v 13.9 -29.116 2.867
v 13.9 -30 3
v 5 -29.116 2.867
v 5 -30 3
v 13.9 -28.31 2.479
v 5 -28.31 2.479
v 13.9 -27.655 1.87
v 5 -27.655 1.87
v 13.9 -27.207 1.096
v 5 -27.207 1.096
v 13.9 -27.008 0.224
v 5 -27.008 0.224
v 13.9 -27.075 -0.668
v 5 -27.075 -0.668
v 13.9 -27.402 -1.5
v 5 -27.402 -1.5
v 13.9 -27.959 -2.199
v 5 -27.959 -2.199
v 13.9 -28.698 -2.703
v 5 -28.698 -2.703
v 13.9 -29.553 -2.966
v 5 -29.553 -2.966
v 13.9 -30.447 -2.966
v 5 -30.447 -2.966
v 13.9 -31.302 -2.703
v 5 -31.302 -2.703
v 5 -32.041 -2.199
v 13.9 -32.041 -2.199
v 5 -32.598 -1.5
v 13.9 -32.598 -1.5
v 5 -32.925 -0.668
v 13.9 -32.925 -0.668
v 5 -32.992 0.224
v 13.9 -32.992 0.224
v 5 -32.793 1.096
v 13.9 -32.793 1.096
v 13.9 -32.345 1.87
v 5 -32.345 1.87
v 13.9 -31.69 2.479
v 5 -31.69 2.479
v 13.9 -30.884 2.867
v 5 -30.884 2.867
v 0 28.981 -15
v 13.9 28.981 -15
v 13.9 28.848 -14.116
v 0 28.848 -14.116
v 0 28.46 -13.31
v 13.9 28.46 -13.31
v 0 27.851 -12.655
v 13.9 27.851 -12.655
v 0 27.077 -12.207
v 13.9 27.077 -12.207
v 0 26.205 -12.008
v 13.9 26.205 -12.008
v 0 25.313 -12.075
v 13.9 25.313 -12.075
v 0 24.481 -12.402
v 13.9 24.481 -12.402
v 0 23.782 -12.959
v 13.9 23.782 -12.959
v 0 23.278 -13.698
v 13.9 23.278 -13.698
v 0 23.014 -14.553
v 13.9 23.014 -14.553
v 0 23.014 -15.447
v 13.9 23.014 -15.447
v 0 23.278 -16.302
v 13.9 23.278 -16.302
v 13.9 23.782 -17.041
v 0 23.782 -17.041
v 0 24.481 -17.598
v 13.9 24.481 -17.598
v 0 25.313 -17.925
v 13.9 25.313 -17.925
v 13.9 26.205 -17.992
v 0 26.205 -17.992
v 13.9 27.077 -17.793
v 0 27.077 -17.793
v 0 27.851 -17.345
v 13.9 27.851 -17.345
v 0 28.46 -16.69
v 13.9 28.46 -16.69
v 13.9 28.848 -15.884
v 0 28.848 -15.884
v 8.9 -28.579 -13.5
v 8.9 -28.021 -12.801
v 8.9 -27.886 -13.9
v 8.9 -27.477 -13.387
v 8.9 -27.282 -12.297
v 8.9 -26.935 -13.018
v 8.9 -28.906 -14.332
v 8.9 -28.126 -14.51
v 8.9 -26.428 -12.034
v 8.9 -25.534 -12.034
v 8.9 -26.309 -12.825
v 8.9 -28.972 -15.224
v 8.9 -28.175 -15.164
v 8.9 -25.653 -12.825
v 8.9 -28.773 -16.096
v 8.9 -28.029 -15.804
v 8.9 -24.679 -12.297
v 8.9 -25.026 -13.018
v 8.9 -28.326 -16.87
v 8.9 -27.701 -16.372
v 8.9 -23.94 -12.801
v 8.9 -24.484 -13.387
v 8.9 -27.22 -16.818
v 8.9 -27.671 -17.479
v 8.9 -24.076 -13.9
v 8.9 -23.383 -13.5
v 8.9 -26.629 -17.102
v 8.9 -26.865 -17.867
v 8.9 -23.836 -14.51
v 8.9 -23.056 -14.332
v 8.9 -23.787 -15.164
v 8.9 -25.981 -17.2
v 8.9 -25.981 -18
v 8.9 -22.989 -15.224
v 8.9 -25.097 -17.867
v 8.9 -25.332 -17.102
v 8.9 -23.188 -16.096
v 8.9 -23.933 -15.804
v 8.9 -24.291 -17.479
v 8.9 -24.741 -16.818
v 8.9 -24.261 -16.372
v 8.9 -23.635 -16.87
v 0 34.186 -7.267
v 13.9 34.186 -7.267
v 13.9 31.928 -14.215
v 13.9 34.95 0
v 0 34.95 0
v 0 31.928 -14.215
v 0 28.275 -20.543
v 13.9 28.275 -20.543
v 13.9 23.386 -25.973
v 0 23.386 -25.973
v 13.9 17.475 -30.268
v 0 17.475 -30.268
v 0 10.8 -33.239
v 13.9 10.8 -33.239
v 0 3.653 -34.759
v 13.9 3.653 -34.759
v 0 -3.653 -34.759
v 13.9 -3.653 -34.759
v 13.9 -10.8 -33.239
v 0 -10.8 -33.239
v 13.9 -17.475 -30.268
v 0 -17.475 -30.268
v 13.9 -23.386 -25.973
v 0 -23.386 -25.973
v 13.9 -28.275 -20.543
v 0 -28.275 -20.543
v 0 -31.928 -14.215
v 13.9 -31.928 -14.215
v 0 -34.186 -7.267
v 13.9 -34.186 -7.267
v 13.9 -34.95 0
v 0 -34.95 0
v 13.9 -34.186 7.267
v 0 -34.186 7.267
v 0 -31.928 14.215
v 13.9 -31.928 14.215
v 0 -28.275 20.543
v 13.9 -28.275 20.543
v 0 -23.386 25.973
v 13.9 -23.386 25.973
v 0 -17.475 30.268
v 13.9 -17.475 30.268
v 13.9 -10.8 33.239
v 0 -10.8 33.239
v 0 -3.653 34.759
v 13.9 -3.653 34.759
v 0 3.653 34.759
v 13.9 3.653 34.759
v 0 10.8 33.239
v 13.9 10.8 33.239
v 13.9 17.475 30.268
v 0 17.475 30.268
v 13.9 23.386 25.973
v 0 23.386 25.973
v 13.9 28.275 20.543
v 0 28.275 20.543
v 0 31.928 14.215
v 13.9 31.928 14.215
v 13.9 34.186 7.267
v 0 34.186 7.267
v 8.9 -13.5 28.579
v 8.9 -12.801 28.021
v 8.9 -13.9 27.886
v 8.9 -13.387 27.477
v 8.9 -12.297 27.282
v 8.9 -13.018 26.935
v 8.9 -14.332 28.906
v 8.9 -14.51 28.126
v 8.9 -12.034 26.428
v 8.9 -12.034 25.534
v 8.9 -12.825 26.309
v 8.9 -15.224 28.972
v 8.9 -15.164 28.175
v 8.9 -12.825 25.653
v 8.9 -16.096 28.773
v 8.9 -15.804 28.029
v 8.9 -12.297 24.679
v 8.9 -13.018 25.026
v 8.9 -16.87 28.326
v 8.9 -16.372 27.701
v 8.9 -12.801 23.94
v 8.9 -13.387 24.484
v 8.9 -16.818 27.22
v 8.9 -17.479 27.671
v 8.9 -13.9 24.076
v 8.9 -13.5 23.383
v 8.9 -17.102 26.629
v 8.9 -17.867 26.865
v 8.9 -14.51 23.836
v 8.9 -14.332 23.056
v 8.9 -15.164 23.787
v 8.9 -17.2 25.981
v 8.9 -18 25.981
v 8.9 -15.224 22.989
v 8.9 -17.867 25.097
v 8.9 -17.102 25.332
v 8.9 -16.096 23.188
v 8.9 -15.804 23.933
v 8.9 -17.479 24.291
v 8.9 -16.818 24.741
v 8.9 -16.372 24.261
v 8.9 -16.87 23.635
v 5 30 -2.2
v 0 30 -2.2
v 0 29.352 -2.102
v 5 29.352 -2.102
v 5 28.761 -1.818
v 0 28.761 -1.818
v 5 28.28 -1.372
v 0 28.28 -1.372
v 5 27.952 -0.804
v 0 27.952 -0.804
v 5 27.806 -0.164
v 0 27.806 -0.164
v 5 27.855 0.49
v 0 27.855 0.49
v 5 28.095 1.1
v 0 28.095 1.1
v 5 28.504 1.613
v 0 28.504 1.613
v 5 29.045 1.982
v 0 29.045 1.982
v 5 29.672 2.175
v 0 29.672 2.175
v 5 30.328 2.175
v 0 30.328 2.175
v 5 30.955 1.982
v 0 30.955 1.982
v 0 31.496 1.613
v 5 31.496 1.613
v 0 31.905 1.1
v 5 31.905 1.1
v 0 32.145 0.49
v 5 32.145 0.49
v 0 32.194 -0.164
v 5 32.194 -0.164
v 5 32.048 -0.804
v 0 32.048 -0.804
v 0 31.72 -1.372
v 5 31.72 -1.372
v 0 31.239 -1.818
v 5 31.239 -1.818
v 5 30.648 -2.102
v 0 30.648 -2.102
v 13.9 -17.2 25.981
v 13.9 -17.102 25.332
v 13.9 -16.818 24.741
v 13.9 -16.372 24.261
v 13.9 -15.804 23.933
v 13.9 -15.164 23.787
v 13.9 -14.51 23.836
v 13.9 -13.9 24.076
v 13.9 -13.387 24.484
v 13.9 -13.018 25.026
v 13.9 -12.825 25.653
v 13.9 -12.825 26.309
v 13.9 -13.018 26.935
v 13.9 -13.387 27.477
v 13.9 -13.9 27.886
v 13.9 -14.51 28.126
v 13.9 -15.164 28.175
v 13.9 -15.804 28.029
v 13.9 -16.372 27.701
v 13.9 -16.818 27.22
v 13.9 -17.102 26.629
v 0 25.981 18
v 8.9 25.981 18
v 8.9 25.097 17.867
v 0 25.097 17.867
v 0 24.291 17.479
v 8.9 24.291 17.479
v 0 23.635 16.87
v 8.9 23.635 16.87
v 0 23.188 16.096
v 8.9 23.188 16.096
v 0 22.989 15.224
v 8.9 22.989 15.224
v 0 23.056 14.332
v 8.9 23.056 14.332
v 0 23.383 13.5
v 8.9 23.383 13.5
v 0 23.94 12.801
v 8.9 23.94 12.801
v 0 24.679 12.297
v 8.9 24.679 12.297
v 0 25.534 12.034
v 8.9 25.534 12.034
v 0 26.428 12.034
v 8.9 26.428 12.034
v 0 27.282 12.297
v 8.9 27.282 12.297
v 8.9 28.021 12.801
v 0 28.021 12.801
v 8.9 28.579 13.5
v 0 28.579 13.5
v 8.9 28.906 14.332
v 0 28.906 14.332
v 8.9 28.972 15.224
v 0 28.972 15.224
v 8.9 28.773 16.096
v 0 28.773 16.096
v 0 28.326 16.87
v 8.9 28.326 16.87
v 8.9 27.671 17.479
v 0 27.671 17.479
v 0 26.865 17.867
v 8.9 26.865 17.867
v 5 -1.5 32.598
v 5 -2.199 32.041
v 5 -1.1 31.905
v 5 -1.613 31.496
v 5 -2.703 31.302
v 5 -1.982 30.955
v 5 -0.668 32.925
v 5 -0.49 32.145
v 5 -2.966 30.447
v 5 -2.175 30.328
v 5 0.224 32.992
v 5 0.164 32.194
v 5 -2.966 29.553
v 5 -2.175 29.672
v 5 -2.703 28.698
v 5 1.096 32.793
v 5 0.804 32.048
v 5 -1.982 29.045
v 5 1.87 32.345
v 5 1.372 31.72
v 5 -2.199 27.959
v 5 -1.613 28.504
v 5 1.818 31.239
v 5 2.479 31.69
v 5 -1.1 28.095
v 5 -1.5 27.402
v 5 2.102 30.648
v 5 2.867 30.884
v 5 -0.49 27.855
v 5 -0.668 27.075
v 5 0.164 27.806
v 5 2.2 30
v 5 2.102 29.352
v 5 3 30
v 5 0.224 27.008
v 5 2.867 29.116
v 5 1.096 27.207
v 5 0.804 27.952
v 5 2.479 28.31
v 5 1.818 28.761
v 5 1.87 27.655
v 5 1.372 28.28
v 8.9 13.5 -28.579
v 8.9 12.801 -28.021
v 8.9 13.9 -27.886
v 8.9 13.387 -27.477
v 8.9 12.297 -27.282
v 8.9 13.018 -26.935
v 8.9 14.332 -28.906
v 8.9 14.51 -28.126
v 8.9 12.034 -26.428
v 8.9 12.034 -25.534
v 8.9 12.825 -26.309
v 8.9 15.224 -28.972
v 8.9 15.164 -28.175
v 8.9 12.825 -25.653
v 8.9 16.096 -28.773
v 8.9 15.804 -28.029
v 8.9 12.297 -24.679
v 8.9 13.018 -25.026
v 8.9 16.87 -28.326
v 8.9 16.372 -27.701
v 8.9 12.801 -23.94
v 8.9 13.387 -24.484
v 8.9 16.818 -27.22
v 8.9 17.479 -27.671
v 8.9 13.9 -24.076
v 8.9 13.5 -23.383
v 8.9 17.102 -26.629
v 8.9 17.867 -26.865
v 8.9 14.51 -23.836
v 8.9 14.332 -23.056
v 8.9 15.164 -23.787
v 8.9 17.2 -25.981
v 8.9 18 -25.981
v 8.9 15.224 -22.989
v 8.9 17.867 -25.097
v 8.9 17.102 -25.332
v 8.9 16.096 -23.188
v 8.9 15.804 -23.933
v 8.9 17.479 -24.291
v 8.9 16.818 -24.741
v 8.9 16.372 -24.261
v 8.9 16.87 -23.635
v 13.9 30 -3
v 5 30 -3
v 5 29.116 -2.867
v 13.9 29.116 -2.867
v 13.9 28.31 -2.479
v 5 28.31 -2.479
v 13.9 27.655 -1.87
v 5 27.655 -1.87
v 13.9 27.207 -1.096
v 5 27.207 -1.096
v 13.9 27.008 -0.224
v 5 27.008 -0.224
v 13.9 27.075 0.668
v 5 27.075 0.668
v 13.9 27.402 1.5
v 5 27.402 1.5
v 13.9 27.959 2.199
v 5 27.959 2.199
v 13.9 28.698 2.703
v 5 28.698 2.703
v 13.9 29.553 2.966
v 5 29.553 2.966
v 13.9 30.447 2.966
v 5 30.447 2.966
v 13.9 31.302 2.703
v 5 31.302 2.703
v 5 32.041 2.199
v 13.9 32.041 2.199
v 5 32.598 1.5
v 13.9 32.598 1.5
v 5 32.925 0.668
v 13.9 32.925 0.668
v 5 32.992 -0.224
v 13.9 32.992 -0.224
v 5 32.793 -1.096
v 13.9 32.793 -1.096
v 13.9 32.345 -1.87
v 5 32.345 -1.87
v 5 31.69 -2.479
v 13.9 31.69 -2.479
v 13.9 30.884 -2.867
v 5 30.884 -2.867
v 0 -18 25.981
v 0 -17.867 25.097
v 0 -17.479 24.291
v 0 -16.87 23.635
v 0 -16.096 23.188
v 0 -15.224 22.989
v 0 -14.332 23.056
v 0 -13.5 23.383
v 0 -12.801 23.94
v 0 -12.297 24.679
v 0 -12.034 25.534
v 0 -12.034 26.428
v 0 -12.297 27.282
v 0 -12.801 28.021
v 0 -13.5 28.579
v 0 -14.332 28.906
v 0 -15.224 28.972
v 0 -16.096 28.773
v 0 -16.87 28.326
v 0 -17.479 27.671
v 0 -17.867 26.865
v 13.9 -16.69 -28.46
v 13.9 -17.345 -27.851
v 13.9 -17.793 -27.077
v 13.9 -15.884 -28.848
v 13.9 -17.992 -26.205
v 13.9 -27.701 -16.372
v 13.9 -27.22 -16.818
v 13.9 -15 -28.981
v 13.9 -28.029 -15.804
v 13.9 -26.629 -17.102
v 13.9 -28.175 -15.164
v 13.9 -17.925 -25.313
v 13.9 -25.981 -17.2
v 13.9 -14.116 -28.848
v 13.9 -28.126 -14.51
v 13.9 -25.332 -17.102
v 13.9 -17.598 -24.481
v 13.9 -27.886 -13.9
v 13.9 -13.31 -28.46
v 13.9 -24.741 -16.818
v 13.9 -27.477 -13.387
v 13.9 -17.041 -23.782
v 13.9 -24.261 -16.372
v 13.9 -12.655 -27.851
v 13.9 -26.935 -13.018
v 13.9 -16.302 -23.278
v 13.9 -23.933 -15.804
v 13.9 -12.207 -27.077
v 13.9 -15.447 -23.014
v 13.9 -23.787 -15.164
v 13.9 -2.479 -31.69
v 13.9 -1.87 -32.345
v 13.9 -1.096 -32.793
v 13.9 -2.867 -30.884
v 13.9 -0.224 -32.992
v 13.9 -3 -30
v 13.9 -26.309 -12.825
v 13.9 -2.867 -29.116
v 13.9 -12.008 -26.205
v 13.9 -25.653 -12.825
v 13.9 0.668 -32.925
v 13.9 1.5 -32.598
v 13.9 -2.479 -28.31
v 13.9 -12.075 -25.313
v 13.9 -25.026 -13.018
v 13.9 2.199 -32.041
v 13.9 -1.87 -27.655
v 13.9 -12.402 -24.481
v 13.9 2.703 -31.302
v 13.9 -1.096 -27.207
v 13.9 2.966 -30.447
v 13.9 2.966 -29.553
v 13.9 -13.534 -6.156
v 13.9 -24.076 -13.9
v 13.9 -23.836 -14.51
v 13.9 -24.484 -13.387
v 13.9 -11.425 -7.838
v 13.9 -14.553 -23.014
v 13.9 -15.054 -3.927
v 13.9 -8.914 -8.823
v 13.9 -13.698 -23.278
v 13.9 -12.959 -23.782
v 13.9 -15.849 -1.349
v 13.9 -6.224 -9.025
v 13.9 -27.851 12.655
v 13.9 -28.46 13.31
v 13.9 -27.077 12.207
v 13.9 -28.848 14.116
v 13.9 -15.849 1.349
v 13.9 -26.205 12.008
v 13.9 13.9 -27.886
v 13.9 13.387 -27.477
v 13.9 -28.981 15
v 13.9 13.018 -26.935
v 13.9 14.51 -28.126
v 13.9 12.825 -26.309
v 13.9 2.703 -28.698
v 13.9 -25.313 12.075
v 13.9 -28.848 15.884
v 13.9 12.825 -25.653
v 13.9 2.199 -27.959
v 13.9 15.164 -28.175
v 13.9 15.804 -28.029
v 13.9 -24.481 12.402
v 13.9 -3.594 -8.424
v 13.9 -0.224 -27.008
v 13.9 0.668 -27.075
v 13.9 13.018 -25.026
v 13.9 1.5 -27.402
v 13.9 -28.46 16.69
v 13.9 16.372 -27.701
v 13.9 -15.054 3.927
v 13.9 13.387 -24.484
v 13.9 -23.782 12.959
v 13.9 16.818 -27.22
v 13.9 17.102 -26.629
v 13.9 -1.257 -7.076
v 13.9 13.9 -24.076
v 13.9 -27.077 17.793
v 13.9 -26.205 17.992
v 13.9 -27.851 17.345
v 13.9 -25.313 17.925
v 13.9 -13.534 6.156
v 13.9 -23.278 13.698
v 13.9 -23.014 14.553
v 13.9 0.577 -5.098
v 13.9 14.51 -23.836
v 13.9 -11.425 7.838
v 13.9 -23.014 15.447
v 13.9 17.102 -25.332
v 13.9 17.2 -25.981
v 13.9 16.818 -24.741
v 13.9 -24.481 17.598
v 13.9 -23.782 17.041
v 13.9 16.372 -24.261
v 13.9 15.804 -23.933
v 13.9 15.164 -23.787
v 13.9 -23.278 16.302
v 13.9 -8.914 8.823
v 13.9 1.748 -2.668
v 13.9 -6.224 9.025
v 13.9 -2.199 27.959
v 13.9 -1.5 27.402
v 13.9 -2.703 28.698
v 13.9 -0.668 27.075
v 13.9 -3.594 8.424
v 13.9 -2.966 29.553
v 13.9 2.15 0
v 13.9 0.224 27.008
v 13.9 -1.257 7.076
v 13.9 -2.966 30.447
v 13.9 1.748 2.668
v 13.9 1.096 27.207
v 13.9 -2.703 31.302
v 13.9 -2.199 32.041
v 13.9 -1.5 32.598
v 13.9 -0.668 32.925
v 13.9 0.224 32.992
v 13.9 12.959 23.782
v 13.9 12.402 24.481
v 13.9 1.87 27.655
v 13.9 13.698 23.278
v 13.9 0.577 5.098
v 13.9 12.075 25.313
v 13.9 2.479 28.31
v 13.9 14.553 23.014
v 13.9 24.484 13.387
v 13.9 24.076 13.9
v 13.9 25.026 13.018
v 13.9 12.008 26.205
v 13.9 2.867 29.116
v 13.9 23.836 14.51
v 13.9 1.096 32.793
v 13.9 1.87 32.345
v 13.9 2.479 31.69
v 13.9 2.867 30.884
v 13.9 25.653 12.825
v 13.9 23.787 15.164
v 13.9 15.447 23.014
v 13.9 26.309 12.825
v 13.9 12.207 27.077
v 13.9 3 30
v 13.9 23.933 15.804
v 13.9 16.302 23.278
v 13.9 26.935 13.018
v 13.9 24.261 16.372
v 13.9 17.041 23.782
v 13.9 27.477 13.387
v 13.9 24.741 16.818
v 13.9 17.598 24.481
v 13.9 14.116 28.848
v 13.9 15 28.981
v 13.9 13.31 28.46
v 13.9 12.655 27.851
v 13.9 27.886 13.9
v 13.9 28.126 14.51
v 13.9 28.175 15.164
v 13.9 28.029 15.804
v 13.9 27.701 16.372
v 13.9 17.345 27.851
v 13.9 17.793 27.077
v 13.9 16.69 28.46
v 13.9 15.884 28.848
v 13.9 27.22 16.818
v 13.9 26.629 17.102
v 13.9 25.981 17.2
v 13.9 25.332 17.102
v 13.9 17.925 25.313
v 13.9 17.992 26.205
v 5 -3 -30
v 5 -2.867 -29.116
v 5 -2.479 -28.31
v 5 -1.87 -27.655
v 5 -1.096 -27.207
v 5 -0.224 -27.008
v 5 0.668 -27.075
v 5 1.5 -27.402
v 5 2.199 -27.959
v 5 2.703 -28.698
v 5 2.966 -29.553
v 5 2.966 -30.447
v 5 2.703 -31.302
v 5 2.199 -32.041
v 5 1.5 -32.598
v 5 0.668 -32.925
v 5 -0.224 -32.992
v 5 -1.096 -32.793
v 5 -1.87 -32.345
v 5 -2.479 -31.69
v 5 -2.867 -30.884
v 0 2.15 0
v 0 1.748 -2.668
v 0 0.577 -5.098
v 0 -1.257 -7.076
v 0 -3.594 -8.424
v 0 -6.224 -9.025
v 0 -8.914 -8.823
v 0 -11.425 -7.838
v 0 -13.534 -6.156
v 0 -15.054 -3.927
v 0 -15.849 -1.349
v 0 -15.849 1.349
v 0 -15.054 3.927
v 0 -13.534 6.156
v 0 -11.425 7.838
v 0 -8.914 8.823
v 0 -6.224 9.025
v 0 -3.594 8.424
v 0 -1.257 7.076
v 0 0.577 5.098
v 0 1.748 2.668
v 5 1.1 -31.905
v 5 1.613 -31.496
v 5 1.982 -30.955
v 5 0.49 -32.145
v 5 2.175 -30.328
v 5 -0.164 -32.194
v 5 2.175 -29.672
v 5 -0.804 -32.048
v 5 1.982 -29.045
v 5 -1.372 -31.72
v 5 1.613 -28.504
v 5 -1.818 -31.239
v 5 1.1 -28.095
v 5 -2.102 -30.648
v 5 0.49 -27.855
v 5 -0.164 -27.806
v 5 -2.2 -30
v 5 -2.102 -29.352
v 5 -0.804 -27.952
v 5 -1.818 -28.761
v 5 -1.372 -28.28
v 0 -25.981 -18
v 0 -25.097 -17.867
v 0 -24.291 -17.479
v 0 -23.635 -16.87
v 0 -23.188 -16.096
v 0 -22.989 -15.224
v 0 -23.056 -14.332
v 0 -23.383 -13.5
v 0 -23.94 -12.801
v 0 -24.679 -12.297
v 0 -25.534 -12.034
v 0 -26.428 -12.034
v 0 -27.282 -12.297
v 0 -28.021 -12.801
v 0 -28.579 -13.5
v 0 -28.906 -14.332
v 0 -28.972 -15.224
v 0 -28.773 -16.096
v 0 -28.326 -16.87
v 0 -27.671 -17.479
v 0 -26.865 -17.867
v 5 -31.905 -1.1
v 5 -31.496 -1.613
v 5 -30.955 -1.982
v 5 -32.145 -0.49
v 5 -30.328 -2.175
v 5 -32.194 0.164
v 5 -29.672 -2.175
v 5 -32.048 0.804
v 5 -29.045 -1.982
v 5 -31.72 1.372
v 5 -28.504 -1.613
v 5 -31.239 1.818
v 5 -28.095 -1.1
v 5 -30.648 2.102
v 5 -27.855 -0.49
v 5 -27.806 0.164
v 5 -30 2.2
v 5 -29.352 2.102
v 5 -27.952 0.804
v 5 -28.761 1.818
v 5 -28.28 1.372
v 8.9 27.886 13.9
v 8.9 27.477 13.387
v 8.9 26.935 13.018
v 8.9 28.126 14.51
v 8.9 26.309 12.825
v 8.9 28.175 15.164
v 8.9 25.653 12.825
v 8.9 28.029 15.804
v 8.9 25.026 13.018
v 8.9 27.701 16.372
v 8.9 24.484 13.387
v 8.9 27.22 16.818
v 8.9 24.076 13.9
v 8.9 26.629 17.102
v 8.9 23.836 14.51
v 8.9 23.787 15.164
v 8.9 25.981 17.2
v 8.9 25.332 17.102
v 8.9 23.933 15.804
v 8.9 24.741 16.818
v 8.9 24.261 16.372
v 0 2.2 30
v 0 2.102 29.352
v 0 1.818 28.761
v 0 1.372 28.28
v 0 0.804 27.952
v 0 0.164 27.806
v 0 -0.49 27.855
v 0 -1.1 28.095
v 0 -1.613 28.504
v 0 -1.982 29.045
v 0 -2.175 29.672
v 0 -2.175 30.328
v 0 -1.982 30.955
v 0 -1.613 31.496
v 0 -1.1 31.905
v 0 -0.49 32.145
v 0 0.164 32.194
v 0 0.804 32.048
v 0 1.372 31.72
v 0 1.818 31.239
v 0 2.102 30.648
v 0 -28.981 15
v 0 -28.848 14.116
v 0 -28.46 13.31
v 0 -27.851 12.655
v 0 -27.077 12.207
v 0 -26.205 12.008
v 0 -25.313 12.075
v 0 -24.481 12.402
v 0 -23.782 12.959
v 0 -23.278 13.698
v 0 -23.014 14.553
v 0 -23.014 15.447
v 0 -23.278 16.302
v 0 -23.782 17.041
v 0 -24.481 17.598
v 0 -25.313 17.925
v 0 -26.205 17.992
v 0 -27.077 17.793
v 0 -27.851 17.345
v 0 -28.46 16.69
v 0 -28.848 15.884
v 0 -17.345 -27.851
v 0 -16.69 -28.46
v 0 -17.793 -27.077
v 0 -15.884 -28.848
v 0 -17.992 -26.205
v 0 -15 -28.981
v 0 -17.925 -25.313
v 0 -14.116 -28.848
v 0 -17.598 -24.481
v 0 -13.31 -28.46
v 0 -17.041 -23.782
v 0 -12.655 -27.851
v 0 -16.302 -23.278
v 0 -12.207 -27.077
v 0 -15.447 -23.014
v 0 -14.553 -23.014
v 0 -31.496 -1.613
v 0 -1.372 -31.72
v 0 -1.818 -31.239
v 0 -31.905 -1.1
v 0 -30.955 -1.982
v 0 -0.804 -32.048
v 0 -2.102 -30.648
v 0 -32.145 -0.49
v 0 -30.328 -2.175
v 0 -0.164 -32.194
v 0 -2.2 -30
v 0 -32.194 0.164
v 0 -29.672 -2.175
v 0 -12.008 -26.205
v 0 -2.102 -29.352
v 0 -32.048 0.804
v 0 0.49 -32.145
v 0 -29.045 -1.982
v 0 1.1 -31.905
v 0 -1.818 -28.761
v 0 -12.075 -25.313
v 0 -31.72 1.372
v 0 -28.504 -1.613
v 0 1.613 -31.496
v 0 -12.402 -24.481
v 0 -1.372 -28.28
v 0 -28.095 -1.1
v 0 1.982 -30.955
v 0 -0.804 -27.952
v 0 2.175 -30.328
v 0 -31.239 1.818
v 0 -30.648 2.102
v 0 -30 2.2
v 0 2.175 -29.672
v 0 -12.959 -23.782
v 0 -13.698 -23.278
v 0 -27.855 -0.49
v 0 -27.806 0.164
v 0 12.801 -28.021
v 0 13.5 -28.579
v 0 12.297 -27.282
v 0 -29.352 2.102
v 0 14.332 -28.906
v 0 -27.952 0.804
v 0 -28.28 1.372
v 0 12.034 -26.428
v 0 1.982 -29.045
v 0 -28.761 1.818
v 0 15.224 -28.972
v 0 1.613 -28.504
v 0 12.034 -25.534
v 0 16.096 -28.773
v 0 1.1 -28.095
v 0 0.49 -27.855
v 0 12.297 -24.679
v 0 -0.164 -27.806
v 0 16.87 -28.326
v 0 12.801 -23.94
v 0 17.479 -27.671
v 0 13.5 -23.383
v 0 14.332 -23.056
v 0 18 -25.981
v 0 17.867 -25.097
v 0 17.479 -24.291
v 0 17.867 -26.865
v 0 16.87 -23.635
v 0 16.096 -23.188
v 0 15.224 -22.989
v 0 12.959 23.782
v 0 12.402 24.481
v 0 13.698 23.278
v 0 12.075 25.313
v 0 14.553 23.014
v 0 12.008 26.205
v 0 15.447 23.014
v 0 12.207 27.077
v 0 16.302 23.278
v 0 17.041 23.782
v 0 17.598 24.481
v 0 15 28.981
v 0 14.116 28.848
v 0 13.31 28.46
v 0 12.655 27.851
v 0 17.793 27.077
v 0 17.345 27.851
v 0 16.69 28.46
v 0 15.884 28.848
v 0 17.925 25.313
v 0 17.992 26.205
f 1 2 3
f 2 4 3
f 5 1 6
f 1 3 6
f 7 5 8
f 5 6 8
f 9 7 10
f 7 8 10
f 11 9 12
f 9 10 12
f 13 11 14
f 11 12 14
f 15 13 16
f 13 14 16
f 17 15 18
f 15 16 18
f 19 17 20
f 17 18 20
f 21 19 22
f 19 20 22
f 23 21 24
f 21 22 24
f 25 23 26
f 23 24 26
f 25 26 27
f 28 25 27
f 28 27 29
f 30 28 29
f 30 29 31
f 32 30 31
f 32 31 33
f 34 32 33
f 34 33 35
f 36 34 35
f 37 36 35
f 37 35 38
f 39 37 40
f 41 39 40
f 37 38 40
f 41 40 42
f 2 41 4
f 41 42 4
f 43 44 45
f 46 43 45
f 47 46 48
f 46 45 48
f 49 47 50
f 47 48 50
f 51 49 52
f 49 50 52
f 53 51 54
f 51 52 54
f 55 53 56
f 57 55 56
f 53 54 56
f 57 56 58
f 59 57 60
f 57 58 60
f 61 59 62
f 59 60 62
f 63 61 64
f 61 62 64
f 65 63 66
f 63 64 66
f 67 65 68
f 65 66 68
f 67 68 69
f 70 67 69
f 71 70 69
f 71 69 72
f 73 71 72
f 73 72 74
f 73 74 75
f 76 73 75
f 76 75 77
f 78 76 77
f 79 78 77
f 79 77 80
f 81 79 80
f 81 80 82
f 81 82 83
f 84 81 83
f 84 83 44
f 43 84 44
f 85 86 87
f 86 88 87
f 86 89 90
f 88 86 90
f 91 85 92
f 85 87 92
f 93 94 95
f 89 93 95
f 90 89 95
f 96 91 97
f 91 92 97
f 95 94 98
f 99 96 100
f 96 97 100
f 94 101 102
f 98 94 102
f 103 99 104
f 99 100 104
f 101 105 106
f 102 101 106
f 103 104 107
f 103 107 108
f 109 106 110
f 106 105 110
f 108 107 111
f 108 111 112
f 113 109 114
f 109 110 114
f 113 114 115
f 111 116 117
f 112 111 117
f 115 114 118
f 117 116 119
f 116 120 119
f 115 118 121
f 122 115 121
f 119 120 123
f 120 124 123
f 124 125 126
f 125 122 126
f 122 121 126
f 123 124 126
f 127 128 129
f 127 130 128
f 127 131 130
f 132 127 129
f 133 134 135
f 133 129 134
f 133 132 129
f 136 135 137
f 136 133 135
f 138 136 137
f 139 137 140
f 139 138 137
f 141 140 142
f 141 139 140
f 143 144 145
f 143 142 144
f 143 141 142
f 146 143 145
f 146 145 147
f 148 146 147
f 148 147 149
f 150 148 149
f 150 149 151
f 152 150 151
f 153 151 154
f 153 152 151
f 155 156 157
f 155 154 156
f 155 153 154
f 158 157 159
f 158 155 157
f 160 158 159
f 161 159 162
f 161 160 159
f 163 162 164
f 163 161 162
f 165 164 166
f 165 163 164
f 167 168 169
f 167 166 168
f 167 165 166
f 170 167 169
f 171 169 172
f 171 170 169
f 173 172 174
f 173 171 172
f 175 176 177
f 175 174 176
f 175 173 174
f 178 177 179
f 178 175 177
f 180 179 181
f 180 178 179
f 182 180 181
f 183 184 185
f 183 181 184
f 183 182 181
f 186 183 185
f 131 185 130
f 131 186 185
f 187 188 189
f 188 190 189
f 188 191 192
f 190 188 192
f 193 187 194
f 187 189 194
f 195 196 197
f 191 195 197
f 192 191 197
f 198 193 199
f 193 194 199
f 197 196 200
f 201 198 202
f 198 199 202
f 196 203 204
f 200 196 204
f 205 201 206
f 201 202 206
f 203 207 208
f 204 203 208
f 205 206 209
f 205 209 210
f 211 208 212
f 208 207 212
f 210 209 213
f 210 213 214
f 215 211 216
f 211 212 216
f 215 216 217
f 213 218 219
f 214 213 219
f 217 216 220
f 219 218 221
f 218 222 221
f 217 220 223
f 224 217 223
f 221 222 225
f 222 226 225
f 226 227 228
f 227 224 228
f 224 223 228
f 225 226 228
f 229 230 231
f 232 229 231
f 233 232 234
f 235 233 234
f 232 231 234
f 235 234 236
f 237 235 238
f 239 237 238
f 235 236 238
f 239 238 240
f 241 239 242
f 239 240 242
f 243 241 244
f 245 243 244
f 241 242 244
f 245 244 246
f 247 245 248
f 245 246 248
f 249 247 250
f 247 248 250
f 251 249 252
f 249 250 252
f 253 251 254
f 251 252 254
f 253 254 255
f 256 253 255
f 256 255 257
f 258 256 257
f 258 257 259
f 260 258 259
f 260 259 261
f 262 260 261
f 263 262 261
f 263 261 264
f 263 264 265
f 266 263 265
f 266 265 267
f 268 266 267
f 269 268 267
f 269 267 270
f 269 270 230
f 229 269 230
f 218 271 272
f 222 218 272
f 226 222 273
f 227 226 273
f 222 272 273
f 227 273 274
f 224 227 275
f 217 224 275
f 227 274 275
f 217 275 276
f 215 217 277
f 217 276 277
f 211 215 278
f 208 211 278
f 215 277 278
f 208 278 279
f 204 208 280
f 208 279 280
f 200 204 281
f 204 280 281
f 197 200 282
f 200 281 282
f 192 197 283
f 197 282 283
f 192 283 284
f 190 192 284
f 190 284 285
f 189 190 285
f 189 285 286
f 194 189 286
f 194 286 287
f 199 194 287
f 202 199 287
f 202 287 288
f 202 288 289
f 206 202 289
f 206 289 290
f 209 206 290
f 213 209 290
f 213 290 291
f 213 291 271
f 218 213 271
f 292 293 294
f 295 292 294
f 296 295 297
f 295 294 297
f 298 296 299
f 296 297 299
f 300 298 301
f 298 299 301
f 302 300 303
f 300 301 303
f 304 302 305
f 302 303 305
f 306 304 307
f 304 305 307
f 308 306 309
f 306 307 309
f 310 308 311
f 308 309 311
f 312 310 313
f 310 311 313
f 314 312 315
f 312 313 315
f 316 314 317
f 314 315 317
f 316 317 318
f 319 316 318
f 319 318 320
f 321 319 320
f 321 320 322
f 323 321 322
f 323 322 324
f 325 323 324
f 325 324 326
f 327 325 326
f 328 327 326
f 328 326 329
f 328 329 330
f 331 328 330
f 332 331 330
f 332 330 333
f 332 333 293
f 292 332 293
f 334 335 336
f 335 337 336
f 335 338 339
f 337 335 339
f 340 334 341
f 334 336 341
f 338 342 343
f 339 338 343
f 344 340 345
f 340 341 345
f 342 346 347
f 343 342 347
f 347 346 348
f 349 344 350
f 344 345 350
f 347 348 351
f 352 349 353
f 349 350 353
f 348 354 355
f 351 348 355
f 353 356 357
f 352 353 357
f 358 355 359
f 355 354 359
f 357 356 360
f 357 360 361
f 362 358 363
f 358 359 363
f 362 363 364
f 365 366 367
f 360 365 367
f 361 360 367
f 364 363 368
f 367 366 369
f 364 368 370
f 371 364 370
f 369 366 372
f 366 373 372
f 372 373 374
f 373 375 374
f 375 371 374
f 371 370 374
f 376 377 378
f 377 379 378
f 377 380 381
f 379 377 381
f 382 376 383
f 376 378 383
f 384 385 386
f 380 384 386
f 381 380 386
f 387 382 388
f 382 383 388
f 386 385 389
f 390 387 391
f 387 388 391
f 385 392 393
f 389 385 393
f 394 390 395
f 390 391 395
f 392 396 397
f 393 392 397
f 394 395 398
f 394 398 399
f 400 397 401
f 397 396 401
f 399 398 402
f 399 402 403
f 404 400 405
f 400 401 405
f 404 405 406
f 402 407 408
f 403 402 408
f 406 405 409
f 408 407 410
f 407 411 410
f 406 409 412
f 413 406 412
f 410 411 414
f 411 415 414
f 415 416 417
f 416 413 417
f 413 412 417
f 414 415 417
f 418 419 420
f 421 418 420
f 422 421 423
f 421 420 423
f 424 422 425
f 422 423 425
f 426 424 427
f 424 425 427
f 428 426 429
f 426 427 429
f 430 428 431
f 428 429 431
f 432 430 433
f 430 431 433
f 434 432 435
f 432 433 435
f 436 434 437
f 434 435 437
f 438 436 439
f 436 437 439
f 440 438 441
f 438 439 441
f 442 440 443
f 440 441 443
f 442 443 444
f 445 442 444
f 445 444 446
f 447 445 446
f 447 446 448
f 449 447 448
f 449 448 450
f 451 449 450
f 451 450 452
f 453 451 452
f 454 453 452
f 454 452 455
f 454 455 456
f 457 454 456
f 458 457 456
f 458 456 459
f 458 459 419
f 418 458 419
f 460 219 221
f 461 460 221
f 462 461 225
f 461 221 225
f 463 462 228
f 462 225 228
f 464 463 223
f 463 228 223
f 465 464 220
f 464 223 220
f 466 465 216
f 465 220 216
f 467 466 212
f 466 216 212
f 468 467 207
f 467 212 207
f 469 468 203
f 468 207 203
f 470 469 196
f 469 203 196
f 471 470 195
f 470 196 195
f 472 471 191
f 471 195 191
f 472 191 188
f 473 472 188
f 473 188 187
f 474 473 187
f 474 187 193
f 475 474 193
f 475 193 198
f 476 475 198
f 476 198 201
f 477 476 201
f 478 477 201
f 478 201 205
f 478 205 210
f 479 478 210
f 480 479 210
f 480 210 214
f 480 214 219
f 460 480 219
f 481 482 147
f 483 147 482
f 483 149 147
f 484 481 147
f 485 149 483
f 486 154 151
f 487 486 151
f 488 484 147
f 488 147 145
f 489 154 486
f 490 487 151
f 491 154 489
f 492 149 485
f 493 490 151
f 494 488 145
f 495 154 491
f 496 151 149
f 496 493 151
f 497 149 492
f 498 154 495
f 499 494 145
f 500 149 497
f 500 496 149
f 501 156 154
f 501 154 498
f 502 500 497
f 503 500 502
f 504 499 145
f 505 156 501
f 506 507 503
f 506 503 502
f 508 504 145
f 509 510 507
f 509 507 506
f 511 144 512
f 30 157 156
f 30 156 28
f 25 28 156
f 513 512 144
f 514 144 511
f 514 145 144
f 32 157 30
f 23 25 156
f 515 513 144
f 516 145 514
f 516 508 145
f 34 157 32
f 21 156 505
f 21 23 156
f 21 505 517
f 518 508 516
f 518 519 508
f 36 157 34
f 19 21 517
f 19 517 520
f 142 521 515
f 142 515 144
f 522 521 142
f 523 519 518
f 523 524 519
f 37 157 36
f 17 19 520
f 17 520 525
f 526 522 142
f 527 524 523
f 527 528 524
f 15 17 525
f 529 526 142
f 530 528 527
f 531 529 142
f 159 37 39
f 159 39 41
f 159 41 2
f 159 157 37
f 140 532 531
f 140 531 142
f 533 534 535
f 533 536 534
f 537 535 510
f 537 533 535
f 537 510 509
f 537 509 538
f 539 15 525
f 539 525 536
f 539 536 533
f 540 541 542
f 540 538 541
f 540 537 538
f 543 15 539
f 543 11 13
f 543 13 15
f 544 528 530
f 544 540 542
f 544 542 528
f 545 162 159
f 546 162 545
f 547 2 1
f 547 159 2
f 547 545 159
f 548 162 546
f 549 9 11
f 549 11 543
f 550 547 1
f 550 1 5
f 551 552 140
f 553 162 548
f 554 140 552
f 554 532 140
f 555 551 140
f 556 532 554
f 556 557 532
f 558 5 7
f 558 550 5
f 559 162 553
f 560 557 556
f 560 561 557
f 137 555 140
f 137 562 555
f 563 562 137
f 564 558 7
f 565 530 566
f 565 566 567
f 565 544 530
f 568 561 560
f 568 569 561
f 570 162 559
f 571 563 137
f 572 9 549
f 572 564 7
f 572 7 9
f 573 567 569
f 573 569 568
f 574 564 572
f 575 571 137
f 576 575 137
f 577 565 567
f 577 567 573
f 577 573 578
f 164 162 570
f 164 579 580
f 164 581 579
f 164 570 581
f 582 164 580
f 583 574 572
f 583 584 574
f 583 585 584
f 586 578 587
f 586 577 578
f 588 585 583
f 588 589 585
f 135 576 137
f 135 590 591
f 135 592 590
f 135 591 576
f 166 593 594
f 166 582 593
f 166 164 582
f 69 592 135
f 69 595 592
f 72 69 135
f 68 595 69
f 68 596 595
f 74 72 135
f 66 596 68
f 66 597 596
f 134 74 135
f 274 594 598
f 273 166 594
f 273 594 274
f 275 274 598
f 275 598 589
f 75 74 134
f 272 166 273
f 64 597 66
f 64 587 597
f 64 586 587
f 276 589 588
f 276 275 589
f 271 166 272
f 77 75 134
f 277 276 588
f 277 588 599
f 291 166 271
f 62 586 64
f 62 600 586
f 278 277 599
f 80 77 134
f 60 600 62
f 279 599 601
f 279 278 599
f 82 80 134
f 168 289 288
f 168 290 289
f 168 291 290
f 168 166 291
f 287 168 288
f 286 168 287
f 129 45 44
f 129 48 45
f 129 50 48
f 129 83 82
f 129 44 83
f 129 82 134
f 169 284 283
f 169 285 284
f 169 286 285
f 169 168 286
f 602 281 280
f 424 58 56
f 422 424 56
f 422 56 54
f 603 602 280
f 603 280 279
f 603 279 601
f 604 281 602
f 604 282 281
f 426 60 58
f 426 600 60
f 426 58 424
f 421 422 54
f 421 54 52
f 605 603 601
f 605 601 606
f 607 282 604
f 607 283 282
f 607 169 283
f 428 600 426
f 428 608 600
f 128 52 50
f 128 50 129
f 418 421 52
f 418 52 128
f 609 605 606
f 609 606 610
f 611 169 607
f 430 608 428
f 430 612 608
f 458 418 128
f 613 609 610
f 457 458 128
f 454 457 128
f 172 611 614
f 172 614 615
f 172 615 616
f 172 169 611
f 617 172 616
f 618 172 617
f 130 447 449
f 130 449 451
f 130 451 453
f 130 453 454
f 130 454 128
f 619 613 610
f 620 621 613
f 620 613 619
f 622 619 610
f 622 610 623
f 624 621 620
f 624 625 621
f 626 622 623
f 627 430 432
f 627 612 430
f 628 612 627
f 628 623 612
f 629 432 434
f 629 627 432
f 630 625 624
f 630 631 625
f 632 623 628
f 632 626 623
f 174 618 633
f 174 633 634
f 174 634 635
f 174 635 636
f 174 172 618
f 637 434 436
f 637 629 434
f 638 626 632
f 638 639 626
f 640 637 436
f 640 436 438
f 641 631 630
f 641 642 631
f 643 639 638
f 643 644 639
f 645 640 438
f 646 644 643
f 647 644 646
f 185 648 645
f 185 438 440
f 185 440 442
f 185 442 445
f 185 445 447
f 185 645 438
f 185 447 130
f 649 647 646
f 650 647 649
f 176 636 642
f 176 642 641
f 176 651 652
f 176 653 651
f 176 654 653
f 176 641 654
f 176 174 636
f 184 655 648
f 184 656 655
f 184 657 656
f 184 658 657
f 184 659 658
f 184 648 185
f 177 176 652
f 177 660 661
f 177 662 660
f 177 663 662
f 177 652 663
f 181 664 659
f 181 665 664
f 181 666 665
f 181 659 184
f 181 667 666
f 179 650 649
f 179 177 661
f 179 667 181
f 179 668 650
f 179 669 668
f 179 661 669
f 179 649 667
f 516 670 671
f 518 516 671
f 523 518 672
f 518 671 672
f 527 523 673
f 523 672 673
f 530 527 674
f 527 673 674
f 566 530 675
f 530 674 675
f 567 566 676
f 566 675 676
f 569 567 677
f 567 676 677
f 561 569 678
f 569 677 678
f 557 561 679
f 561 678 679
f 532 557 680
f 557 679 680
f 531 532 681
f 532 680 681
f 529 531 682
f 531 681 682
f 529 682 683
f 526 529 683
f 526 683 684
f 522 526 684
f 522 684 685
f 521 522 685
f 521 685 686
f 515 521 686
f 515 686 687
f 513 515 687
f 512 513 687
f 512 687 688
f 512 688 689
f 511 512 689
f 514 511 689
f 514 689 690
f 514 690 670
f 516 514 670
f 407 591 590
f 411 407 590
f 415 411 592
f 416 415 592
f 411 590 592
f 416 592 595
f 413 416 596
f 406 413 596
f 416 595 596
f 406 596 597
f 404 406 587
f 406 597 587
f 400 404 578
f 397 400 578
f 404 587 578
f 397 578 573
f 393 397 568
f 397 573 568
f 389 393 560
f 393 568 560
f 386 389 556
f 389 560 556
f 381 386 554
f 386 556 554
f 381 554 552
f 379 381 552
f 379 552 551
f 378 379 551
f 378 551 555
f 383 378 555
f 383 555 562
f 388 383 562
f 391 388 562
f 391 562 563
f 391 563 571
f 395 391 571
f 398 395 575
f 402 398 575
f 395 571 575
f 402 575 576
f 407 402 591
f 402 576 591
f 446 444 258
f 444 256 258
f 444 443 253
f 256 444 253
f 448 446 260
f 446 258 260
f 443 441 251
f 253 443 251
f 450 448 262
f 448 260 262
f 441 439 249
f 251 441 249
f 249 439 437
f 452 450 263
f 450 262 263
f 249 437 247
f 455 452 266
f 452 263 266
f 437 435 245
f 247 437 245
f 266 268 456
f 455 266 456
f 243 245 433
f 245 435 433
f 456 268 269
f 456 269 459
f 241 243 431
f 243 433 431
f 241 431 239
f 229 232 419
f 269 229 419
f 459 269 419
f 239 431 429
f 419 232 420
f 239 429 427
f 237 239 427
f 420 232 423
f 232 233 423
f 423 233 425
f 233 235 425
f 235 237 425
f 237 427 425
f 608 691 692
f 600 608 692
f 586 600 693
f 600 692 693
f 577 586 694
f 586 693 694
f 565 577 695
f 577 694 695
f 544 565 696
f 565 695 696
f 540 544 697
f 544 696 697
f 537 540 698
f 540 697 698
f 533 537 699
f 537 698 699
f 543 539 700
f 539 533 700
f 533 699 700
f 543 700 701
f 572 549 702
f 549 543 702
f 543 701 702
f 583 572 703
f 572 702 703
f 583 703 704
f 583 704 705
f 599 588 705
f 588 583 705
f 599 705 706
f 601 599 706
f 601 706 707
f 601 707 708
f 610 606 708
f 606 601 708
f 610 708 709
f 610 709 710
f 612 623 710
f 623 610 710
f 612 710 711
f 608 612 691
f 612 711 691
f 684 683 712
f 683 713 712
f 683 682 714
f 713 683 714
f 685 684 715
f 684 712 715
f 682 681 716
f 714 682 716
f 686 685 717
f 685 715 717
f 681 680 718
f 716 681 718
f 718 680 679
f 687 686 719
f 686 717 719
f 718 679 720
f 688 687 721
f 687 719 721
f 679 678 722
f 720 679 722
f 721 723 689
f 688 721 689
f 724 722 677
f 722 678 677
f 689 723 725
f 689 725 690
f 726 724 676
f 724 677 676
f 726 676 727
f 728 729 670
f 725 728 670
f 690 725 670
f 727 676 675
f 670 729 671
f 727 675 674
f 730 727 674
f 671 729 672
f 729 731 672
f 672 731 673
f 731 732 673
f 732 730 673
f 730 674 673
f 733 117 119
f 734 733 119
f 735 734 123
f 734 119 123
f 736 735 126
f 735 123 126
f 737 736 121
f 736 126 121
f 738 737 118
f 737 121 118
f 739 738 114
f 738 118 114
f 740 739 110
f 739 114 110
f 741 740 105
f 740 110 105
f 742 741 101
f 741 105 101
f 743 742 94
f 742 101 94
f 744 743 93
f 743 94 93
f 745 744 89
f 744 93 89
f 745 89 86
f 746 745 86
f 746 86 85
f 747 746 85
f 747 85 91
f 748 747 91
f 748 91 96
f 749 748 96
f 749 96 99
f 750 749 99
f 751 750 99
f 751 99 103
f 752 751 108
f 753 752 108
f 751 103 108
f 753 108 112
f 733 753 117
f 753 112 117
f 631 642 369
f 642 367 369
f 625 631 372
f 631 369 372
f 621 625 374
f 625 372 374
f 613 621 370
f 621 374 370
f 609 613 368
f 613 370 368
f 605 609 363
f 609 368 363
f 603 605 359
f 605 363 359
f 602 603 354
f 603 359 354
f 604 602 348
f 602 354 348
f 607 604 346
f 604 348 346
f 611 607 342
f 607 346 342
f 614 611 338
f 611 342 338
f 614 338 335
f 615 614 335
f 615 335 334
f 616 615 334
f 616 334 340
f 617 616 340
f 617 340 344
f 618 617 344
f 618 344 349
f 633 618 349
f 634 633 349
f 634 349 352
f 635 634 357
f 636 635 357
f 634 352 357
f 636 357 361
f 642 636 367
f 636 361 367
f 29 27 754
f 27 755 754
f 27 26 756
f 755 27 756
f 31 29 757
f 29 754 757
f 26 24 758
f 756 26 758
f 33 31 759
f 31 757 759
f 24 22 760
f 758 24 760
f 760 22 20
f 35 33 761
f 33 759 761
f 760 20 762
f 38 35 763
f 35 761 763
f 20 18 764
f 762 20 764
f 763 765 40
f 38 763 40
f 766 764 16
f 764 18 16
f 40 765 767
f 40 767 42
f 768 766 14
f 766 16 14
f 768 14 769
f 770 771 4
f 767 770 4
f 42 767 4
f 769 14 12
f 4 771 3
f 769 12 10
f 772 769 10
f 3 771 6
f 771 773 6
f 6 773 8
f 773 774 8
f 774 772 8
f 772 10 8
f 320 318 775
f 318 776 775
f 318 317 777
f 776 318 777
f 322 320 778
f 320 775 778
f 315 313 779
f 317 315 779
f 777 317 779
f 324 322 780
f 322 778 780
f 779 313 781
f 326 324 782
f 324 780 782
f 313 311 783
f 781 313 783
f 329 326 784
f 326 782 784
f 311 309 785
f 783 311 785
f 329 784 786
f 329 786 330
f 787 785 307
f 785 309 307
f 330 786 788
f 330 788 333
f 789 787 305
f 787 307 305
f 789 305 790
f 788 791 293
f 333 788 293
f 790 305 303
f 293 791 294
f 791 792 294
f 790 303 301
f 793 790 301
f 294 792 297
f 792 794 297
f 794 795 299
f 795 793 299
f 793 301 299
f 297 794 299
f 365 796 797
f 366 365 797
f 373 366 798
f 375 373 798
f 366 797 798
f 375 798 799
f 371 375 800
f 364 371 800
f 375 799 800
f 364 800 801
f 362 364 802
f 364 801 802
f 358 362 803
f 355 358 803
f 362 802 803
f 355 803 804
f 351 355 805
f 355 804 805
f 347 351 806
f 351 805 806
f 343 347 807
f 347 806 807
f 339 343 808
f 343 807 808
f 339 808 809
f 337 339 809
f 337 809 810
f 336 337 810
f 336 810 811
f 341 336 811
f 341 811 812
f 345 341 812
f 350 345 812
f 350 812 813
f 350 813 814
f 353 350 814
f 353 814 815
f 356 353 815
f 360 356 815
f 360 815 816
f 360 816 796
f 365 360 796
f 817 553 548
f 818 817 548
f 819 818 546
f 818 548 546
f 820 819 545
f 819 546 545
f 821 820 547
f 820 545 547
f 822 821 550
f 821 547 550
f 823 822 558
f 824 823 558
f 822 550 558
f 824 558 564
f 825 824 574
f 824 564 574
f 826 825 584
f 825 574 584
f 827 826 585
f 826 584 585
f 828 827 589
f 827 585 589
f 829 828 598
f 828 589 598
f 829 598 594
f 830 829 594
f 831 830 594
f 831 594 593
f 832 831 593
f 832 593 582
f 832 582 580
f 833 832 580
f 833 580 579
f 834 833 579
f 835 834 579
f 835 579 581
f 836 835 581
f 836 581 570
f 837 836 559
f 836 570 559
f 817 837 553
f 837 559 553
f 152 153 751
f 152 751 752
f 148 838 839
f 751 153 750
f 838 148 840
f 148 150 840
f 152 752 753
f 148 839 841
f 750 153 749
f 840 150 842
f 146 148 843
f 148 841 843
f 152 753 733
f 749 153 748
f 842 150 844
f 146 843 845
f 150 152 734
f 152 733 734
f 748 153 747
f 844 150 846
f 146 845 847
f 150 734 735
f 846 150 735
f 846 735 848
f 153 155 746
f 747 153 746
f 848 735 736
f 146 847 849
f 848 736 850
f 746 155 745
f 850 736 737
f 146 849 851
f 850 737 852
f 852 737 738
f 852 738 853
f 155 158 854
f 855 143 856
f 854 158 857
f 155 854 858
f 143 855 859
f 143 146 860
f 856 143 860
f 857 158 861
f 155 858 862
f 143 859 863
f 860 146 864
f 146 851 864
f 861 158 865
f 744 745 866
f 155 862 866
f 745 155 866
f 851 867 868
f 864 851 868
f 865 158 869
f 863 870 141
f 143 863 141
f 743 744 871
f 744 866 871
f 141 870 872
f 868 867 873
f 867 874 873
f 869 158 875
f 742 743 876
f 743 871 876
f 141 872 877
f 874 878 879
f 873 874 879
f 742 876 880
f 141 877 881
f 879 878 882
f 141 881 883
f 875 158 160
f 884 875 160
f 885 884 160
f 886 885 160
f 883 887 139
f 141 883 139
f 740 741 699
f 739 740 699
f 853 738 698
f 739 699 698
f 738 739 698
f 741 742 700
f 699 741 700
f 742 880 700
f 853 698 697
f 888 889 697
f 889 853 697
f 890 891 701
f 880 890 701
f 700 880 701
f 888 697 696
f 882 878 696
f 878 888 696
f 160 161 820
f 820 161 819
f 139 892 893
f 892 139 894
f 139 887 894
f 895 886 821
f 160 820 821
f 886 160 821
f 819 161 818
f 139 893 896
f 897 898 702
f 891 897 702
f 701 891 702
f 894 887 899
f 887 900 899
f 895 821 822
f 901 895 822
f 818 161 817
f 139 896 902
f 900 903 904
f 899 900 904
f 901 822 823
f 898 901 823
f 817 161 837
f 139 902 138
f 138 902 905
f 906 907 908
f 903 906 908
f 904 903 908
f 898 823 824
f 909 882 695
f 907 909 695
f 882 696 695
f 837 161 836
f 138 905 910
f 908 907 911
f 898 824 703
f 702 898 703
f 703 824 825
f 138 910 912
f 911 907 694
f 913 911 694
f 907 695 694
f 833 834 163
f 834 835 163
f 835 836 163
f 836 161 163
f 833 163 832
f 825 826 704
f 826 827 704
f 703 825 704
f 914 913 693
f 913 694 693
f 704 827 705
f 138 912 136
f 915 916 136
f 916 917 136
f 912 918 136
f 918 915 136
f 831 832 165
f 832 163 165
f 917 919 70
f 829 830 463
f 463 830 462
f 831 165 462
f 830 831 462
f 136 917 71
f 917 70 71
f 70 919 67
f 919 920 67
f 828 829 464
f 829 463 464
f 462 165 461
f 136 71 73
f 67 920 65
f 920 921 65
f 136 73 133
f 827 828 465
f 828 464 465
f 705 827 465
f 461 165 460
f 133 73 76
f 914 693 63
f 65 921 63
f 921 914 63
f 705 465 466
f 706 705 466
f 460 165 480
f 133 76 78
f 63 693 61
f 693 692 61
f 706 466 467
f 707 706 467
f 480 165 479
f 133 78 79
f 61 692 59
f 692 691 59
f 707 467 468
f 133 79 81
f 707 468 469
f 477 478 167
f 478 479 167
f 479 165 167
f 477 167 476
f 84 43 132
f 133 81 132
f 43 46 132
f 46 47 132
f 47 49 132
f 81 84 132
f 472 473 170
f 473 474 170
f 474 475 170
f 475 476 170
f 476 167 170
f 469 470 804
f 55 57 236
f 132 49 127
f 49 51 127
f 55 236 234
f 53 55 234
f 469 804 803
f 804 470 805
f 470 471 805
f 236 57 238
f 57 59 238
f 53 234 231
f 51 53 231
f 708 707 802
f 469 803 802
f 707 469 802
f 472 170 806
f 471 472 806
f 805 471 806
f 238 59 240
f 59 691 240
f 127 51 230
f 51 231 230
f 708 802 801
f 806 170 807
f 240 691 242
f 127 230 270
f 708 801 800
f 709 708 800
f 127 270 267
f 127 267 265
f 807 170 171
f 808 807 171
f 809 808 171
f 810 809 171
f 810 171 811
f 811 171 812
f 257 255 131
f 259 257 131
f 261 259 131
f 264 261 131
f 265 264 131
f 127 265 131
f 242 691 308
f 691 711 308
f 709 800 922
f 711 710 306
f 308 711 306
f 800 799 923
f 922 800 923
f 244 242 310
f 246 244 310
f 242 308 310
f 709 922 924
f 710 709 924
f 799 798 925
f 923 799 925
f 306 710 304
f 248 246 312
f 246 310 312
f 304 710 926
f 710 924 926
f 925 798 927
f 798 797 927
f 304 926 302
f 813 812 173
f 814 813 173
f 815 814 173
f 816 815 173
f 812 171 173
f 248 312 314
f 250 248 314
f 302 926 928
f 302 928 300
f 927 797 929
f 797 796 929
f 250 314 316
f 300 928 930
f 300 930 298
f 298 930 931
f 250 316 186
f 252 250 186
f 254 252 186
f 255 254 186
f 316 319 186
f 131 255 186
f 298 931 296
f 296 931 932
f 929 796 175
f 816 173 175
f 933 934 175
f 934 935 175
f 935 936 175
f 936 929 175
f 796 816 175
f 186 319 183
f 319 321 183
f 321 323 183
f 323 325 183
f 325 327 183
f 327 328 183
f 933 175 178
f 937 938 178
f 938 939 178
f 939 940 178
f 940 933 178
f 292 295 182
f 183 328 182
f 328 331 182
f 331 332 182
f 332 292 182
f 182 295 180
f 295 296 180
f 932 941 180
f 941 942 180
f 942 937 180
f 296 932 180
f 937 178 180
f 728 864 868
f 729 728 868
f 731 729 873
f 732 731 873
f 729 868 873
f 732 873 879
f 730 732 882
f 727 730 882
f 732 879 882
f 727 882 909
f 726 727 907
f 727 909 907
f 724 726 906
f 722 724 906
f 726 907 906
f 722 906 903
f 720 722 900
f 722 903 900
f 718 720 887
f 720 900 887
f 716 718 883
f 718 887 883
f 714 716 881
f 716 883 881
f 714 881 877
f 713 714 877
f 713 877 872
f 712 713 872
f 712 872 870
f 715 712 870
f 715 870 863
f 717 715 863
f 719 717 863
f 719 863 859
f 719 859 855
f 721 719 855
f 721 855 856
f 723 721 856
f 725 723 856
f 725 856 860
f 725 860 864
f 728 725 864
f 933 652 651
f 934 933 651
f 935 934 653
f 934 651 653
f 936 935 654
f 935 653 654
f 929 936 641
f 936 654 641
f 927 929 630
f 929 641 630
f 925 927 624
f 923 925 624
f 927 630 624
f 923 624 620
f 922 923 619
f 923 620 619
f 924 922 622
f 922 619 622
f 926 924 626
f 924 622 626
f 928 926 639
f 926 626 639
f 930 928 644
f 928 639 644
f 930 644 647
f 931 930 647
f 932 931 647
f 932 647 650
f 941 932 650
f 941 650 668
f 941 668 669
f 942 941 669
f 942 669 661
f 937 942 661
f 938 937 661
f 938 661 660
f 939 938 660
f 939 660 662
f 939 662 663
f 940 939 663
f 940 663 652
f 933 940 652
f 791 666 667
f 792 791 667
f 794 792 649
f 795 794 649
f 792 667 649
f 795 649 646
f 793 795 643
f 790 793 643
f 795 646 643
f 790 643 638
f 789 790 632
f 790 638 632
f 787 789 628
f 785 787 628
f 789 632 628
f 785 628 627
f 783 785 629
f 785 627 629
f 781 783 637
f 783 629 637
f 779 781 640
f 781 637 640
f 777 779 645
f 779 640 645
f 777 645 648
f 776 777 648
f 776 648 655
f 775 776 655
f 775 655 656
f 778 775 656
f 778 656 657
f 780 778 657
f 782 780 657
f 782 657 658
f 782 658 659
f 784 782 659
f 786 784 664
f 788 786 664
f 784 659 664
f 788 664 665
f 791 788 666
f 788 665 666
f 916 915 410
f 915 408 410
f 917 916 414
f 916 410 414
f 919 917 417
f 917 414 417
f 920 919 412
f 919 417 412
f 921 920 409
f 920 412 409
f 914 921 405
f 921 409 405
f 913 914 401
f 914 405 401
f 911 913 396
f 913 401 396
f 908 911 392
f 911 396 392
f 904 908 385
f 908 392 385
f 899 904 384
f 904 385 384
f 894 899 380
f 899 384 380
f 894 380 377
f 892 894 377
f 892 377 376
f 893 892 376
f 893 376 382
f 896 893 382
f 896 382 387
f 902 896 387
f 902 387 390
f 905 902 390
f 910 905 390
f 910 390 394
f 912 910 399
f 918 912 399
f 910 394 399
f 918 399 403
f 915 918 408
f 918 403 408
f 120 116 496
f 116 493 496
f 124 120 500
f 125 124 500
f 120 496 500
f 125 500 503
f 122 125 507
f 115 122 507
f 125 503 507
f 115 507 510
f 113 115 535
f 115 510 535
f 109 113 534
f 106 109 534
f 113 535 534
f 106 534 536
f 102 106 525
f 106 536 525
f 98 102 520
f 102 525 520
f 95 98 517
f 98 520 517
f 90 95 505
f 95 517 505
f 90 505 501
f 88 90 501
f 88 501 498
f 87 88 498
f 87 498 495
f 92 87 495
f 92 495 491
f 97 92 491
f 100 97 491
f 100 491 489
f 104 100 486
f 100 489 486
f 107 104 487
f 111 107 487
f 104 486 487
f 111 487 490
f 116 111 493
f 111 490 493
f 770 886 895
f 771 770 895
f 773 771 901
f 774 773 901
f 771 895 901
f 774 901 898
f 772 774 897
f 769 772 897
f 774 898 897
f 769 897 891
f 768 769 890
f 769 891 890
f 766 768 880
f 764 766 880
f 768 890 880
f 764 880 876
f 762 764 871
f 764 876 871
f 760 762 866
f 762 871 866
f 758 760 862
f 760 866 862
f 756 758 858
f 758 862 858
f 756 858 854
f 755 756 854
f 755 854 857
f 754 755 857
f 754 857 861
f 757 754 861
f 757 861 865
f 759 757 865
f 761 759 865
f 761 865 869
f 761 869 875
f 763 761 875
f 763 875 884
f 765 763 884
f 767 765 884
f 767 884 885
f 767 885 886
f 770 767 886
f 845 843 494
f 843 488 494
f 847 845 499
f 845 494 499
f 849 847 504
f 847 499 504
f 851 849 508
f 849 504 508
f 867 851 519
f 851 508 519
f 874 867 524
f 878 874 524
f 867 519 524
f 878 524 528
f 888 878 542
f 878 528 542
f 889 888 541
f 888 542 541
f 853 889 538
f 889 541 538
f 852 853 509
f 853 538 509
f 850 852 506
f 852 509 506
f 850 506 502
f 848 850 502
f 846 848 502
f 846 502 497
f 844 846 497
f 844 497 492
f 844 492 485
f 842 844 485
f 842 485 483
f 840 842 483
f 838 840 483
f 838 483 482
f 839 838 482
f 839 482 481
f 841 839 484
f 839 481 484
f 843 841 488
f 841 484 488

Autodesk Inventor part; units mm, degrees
ref_plane "YZ Plane" through (0, 0, 0) normal (1, 0, 0) x (0, 1, 0)
ref_plane "XZ Plane" through (0, 0, 0) normal (0, 1, 0) x (-1, 0, 0)
ref_plane "XY Plane" through (0, 0, 0) normal (0, 0, 1) x (1, 0, 0)
sketch "Sketch1" plane through (0, 0, 0) normal (1, 0, 0) x (0, 1, 0)
  circle A0 centre (0, 0) radius 34.95
  circle A1 centre (-6.9, 0) radius 9.05
  dimension "d0" = 69.9
  dimension "d1" = 18.1
  dimension "d2" = 6.9
extrude "Extrusion1" add sketch "Sketch1" along normal blind 13.9
sketch "Sketch2" plane through (13.9, 0, 0) normal (1, 0, 0) x (0, 0, -1)
  circle A0 centre (0, 0) radius 30
  point P0 (0, 30)
  dimension "d5" = 60
hole "Hole1" at (13.9, 30, 0) direction (-1, 0, 0) diameter 4.4 depth 13.9 counterbore diameter 6 counterbore depth 8.9
pattern_circular "Circular Pattern1" count 4 over 360 about axis through (0, 0, 0) along (1, 0, 0) of "Hole1"
sketch "Sketch4" plane through (0, 0, 0) normal (-1, 0, 0) x (0, 0, 1)
  circle A0 centre (0, 0) radius 30
  line L0 (0, 0) -> (25.9808, 15)
  line L1 (0, 0) -> (30, 0) construction
  dimension "d28" = 60
  dimension "d29" = 30
hole "Hole3" at (0, 15, 25.9808) direction (1, 0, 0) diameter 6 end through all
pattern_circular "Circular Pattern3" count 4 over 360 about axis through (0, 0, 0) along (1, 0, 0) of "Hole3"
sketch "Sketch5" plane through (0, 0, 0) normal (-1, 0, 0) x (0, 0, 1)
  circle A0 centre (0, 0) radius 30
  line L0 (0, 0) -> (15, 25.9808)
  line L1 (0, 0) -> (30, 0) construction
  point P0 (15, 25.9808)
  dimension "d40" = 60
  dimension "d41" = 60
hole "Hole4" at (0, 25.9808, 15) direction (1, 0, 0) diameter 4.4 depth 13.9 counterbore diameter 6 counterbore depth 8.9
pattern_circular "Circular Pattern4" count 4 over 360 about axis through (0, 0, 0) along (1, 0, 0) of "Hole4"
properties part number "sample-transfer_insulation" material "ABS Plastic light yellow"
